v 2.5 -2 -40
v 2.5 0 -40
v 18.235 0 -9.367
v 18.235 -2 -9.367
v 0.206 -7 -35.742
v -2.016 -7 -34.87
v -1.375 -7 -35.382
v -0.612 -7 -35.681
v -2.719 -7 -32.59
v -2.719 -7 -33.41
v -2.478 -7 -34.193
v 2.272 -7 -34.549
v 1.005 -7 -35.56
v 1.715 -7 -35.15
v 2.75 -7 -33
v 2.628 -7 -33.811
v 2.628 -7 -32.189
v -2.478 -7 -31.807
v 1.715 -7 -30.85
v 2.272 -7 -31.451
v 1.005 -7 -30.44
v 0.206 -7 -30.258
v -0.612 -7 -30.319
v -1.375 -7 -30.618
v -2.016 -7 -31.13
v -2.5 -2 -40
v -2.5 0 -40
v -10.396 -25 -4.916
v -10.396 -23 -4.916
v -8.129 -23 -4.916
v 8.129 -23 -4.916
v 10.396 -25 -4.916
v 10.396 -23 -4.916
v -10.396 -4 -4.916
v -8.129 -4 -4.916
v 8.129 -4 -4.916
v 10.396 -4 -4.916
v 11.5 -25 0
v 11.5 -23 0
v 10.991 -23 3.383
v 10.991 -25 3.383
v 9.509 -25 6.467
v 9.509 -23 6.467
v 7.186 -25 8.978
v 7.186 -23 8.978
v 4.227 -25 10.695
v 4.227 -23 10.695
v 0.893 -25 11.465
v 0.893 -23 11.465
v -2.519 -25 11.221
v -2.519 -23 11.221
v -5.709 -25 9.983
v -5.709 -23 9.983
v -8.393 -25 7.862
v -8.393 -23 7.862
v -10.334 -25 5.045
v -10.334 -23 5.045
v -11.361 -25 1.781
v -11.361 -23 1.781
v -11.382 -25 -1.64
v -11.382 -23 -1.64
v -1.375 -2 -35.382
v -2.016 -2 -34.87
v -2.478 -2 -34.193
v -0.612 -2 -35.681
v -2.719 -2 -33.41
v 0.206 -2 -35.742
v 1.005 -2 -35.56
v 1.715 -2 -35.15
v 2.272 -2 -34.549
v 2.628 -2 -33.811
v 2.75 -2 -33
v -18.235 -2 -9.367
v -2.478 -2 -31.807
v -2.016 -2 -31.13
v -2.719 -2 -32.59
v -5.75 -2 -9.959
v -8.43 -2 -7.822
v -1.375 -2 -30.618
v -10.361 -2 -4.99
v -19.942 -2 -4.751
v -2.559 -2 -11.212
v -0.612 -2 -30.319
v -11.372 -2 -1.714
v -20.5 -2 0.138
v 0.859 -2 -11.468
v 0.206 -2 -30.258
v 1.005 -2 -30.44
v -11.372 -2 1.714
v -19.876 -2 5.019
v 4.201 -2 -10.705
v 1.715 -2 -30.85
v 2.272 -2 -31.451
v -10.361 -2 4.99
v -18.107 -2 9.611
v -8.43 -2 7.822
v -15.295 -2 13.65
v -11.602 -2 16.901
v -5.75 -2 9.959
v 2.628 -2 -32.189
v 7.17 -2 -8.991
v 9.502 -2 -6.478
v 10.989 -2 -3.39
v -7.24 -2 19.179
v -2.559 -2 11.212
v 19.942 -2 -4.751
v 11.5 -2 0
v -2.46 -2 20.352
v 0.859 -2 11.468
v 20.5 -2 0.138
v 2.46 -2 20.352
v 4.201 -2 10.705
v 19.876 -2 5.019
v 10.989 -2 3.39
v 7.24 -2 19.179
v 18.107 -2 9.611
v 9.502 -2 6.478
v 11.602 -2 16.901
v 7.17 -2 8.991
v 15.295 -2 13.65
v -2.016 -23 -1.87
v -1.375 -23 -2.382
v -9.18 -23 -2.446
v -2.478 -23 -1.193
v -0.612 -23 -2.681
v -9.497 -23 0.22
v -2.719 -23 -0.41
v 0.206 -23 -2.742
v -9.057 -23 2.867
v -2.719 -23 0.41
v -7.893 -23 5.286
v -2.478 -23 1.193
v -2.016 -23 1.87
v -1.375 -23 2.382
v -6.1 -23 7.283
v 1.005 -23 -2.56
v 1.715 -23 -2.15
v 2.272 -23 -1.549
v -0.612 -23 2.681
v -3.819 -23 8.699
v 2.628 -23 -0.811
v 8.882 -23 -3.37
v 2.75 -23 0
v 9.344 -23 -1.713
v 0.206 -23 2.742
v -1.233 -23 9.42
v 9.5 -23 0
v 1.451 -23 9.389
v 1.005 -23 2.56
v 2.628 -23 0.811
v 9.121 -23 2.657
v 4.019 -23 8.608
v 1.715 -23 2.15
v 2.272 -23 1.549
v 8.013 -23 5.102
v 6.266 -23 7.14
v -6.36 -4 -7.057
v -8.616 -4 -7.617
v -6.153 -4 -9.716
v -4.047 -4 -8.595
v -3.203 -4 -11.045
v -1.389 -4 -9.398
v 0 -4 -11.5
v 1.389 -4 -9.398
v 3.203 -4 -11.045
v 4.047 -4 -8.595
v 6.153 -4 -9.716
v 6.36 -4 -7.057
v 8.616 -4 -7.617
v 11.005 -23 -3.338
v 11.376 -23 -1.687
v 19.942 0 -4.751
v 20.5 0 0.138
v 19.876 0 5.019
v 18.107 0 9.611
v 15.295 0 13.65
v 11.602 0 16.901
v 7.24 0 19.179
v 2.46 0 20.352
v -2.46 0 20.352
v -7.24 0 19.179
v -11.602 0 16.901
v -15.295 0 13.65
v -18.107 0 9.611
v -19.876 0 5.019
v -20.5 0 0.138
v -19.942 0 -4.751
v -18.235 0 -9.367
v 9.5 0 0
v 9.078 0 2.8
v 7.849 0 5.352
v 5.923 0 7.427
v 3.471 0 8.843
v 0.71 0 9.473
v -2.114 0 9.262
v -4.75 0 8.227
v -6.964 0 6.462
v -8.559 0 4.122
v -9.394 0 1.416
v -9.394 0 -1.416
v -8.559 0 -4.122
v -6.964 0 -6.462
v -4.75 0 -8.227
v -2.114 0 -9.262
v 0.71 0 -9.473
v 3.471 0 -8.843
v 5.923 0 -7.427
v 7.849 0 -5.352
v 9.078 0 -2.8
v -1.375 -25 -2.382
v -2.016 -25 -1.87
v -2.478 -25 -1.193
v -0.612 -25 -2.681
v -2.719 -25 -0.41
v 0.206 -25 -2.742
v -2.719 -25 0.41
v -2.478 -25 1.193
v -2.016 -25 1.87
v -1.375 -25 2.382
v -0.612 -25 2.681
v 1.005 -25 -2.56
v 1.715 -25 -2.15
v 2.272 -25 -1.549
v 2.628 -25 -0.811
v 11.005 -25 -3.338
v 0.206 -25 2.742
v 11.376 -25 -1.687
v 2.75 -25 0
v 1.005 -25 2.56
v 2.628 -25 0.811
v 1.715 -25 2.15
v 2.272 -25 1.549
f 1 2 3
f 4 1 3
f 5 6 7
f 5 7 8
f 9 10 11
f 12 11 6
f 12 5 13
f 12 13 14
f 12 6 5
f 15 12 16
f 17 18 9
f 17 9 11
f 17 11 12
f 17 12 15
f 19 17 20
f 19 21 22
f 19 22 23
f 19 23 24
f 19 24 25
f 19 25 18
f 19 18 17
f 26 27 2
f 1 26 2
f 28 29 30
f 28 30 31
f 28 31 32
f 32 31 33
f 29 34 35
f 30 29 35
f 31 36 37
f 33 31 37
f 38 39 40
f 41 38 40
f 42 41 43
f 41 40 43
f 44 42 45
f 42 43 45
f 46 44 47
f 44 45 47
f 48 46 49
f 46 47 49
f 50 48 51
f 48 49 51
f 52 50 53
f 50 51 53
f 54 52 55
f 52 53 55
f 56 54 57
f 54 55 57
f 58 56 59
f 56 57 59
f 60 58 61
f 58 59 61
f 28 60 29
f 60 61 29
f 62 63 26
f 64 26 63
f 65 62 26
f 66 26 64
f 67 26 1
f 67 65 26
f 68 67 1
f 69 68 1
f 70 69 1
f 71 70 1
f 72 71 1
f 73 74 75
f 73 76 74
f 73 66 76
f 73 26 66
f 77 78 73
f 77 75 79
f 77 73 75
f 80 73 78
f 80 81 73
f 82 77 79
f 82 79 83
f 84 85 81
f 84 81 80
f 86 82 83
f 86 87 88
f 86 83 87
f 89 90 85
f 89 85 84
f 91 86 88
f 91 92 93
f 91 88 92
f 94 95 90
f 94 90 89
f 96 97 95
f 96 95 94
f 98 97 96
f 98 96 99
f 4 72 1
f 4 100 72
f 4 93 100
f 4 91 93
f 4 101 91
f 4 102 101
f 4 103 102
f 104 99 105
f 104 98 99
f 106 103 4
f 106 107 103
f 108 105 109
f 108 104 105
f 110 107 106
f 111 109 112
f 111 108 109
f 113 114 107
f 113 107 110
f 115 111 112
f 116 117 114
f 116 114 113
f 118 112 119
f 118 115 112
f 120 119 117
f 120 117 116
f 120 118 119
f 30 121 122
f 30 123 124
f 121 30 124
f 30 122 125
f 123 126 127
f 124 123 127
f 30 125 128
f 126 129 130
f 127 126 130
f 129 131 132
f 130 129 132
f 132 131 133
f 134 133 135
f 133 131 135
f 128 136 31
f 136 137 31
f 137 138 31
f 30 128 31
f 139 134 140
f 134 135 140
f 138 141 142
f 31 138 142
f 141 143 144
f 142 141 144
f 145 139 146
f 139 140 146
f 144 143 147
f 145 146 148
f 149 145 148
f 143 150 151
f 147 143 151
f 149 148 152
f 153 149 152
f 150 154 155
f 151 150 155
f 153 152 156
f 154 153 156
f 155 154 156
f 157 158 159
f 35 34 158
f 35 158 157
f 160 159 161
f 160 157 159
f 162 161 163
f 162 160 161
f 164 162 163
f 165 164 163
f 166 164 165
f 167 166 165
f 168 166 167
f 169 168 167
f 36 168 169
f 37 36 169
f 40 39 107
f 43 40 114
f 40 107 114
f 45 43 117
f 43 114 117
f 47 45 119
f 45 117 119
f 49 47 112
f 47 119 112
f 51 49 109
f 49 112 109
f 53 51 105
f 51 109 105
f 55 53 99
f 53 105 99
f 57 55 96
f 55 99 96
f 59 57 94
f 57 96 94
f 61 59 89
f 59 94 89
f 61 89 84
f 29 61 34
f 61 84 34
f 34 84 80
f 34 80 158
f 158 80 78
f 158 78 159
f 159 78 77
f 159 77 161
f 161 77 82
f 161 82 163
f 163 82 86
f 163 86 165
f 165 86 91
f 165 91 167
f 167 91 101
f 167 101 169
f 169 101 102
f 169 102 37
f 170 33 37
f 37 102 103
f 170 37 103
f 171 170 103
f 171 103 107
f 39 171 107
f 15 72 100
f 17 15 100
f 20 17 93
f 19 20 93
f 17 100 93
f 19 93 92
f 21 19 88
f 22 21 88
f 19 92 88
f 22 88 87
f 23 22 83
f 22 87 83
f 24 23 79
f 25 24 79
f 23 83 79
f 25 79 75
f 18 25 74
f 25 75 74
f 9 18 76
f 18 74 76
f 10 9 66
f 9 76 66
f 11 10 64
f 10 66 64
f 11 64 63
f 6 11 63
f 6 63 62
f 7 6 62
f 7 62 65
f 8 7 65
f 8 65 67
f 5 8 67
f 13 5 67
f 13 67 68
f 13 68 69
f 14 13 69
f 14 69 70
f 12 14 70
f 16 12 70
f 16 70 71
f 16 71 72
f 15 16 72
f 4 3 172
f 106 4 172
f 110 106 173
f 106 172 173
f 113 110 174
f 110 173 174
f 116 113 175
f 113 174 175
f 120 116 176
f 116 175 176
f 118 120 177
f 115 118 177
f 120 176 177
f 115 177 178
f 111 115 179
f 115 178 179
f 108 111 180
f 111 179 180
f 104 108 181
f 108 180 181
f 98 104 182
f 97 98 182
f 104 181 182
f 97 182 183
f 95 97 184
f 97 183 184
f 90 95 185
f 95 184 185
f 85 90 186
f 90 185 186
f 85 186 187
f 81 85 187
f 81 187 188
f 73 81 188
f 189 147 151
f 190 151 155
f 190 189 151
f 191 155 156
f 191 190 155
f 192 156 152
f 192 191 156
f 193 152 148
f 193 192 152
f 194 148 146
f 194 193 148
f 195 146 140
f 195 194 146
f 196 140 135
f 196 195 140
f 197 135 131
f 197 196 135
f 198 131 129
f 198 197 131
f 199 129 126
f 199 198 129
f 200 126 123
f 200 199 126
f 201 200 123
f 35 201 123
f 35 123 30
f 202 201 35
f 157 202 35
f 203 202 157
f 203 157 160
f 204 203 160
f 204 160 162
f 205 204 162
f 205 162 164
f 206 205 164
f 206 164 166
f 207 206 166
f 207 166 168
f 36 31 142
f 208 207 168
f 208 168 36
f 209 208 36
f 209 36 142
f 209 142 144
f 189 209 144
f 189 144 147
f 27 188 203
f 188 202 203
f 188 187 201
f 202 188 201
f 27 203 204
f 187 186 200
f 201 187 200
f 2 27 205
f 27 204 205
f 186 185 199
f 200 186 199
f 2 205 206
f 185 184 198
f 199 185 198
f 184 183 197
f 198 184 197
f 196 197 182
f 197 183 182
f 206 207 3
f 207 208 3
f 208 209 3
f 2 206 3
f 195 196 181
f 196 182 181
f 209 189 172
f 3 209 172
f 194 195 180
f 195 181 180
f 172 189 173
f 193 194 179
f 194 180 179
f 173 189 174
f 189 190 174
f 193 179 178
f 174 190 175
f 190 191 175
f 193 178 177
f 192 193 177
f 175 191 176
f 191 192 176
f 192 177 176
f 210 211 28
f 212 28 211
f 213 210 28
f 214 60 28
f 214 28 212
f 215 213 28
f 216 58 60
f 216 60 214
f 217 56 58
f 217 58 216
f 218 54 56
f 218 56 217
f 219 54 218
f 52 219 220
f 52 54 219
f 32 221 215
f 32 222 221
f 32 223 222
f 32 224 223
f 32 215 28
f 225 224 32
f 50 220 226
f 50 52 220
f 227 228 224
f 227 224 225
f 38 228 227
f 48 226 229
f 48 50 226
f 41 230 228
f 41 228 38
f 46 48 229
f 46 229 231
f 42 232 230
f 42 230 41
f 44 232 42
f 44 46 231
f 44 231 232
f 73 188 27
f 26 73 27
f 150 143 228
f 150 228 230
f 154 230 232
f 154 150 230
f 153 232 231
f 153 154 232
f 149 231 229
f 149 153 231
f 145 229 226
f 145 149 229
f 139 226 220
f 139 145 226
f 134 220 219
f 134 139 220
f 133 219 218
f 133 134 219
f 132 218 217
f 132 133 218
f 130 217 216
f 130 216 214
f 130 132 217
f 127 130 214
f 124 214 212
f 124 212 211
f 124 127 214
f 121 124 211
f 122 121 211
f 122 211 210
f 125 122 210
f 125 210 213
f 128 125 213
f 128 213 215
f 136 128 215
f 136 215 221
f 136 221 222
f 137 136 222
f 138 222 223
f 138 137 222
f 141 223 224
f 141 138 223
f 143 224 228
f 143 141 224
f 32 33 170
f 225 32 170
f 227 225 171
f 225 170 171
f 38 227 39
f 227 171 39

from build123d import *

# Parameters (mm, degrees)
F0_R      = 2.75
F0_R_2    = 11.5
F1_DEPTH  = 2
F3_DEPTH  = 29
F4_R      = 11.5
F4_R_2    = 2.75
F5_DEPTH  = 2
F0_R_3    = 9.5
F8_DEPTH  = 23
F9_DEPTH  = 7
F11_DEPTH = 19
F12_R     = 2.75
F13_DEPTH = 2


with BuildPart() as f1:
    # F0 (on Front) → F1 (new body)
    with BuildSketch(Plane.XZ):
        with BuildLine():
            Line((2.5, -40), (18.2350646454, -9.3665584597))
            ThreePointArc((18.2350646454, -9.3665584597), (0, 20.5), (-18.2350646454, -9.3665584597))
            Line((-18.2350646454, -9.3665584597), (-2.5, -40))
            Line((-2.5, -40), (2.5, -40))
        make_face()
        with Locations((0, -33)):
            Circle(F0_R, mode=Mode.SUBTRACT)
        Circle(F0_R_2, mode=Mode.SUBTRACT)
    extrude(amount=F1_DEPTH)

    # F0 (on Front) → F8 (join)
    with BuildSketch(Plane.XZ):
        Circle(F0_R_2)
        Circle(F0_R_3, mode=Mode.SUBTRACT)
    extrude(amount=F8_DEPTH)

    # F0 (on Front) → F9 (join)
    with BuildSketch(Plane.XZ):
        with Locations((0, -33)):
            Circle(F0_R)
    extrude(amount=F9_DEPTH)

    # F10 (on face) → F11 (cut)
    with BuildSketch(Plane.XZ.offset(23)):
        with BuildLine():
            Line((-8.129197368, -4.9159078665), (-10.3963382904, -4.9159078665))
            ThreePointArc((-10.3963382904, -4.9159078665), (0, -11.5), (10.3963382904, -4.9159078665))
            Line((10.3963382904, -4.9159078665), (8.129197368, -4.9159078665))
            ThreePointArc((8.129197368, -4.9159078665), (0, -9.5), (-8.129197368, -4.9159078665))
        make_face()
    extrude(amount=-F11_DEPTH, mode=Mode.SUBTRACT)

    # F12 (on face) → F13 (join)
    with BuildSketch(Plane.XZ.offset(23)):
        with BuildLine():
            Line((8.129197368, -4.9159078665), (10.3963382904, -4.9159078665))
            ThreePointArc((10.3963382904, -4.9159078665), (11.2206927224, -2.5191377156), (11.5, 0))
            ThreePointArc((11.5, 0), (-2.5191377156, 11.2206927224), (-10.3963382904, -4.9159078665))
            Line((-10.3963382904, -4.9159078665), (-8.129197368, -4.9159078665))
            ThreePointArc((-8.129197368, -4.9159078665), (-2.5517273565, 9.15088452), (9.5, 0))
            ThreePointArc((9.5, 0), (9.15088452, -2.5517273565), (8.129197368, -4.9159078665))
        make_face()
        with BuildLine():
            Line((-8.129197368, -4.9159078665), (8.129197368, -4.9159078665))
            ThreePointArc((8.129197368, -4.9159078665), (9.15088452, -2.5517273565), (9.5, 0))
            ThreePointArc((9.5, 0), (-2.5517273565, 9.15088452), (-8.129197368, -4.9159078665))
        make_face()
        Circle(F12_R, mode=Mode.SUBTRACT)
    extrude(amount=F13_DEPTH)


with BuildPart() as f3:
    # F2 (on face) → F3 (new body)
    with BuildSketch(Plane(origin=(0, 0, 0), x_dir=(-1, 0, 0), z_dir=(0, 1, 0))):
        with BuildLine():
            ThreePointArc((0, 11.5), (-8.1317279836, 8.1317279836), (-11.5, 0))
            ThreePointArc((-11.5, 0), (-11.2103927734, -2.5645845405), (-10.3561575886, -5))
            Line((-10.3561575886, -5), (-8.6602540378, -5))
            ThreePointArc((-8.6602540378, -5), (0, 10), (8.6602540378, -5))
            Line((8.6602540378, -5), (10.3561575886, -5))
            ThreePointArc((10.3561575886, -5), (11.2103927734, -2.5645845405), (11.5, 0))
            ThreePointArc((11.5, 0), (8.1317279836, 8.1317279836), (0, 11.5))
        make_face()
    extrude(amount=F3_DEPTH)


with BuildPart() as f5:
    # F4 (on Front) → F5 (new body)
    with BuildSketch(Plane.XZ):
        Circle(F4_R)
        Circle(F4_R_2, mode=Mode.SUBTRACT)
    extrude(amount=F5_DEPTH)


solid = f1.part
